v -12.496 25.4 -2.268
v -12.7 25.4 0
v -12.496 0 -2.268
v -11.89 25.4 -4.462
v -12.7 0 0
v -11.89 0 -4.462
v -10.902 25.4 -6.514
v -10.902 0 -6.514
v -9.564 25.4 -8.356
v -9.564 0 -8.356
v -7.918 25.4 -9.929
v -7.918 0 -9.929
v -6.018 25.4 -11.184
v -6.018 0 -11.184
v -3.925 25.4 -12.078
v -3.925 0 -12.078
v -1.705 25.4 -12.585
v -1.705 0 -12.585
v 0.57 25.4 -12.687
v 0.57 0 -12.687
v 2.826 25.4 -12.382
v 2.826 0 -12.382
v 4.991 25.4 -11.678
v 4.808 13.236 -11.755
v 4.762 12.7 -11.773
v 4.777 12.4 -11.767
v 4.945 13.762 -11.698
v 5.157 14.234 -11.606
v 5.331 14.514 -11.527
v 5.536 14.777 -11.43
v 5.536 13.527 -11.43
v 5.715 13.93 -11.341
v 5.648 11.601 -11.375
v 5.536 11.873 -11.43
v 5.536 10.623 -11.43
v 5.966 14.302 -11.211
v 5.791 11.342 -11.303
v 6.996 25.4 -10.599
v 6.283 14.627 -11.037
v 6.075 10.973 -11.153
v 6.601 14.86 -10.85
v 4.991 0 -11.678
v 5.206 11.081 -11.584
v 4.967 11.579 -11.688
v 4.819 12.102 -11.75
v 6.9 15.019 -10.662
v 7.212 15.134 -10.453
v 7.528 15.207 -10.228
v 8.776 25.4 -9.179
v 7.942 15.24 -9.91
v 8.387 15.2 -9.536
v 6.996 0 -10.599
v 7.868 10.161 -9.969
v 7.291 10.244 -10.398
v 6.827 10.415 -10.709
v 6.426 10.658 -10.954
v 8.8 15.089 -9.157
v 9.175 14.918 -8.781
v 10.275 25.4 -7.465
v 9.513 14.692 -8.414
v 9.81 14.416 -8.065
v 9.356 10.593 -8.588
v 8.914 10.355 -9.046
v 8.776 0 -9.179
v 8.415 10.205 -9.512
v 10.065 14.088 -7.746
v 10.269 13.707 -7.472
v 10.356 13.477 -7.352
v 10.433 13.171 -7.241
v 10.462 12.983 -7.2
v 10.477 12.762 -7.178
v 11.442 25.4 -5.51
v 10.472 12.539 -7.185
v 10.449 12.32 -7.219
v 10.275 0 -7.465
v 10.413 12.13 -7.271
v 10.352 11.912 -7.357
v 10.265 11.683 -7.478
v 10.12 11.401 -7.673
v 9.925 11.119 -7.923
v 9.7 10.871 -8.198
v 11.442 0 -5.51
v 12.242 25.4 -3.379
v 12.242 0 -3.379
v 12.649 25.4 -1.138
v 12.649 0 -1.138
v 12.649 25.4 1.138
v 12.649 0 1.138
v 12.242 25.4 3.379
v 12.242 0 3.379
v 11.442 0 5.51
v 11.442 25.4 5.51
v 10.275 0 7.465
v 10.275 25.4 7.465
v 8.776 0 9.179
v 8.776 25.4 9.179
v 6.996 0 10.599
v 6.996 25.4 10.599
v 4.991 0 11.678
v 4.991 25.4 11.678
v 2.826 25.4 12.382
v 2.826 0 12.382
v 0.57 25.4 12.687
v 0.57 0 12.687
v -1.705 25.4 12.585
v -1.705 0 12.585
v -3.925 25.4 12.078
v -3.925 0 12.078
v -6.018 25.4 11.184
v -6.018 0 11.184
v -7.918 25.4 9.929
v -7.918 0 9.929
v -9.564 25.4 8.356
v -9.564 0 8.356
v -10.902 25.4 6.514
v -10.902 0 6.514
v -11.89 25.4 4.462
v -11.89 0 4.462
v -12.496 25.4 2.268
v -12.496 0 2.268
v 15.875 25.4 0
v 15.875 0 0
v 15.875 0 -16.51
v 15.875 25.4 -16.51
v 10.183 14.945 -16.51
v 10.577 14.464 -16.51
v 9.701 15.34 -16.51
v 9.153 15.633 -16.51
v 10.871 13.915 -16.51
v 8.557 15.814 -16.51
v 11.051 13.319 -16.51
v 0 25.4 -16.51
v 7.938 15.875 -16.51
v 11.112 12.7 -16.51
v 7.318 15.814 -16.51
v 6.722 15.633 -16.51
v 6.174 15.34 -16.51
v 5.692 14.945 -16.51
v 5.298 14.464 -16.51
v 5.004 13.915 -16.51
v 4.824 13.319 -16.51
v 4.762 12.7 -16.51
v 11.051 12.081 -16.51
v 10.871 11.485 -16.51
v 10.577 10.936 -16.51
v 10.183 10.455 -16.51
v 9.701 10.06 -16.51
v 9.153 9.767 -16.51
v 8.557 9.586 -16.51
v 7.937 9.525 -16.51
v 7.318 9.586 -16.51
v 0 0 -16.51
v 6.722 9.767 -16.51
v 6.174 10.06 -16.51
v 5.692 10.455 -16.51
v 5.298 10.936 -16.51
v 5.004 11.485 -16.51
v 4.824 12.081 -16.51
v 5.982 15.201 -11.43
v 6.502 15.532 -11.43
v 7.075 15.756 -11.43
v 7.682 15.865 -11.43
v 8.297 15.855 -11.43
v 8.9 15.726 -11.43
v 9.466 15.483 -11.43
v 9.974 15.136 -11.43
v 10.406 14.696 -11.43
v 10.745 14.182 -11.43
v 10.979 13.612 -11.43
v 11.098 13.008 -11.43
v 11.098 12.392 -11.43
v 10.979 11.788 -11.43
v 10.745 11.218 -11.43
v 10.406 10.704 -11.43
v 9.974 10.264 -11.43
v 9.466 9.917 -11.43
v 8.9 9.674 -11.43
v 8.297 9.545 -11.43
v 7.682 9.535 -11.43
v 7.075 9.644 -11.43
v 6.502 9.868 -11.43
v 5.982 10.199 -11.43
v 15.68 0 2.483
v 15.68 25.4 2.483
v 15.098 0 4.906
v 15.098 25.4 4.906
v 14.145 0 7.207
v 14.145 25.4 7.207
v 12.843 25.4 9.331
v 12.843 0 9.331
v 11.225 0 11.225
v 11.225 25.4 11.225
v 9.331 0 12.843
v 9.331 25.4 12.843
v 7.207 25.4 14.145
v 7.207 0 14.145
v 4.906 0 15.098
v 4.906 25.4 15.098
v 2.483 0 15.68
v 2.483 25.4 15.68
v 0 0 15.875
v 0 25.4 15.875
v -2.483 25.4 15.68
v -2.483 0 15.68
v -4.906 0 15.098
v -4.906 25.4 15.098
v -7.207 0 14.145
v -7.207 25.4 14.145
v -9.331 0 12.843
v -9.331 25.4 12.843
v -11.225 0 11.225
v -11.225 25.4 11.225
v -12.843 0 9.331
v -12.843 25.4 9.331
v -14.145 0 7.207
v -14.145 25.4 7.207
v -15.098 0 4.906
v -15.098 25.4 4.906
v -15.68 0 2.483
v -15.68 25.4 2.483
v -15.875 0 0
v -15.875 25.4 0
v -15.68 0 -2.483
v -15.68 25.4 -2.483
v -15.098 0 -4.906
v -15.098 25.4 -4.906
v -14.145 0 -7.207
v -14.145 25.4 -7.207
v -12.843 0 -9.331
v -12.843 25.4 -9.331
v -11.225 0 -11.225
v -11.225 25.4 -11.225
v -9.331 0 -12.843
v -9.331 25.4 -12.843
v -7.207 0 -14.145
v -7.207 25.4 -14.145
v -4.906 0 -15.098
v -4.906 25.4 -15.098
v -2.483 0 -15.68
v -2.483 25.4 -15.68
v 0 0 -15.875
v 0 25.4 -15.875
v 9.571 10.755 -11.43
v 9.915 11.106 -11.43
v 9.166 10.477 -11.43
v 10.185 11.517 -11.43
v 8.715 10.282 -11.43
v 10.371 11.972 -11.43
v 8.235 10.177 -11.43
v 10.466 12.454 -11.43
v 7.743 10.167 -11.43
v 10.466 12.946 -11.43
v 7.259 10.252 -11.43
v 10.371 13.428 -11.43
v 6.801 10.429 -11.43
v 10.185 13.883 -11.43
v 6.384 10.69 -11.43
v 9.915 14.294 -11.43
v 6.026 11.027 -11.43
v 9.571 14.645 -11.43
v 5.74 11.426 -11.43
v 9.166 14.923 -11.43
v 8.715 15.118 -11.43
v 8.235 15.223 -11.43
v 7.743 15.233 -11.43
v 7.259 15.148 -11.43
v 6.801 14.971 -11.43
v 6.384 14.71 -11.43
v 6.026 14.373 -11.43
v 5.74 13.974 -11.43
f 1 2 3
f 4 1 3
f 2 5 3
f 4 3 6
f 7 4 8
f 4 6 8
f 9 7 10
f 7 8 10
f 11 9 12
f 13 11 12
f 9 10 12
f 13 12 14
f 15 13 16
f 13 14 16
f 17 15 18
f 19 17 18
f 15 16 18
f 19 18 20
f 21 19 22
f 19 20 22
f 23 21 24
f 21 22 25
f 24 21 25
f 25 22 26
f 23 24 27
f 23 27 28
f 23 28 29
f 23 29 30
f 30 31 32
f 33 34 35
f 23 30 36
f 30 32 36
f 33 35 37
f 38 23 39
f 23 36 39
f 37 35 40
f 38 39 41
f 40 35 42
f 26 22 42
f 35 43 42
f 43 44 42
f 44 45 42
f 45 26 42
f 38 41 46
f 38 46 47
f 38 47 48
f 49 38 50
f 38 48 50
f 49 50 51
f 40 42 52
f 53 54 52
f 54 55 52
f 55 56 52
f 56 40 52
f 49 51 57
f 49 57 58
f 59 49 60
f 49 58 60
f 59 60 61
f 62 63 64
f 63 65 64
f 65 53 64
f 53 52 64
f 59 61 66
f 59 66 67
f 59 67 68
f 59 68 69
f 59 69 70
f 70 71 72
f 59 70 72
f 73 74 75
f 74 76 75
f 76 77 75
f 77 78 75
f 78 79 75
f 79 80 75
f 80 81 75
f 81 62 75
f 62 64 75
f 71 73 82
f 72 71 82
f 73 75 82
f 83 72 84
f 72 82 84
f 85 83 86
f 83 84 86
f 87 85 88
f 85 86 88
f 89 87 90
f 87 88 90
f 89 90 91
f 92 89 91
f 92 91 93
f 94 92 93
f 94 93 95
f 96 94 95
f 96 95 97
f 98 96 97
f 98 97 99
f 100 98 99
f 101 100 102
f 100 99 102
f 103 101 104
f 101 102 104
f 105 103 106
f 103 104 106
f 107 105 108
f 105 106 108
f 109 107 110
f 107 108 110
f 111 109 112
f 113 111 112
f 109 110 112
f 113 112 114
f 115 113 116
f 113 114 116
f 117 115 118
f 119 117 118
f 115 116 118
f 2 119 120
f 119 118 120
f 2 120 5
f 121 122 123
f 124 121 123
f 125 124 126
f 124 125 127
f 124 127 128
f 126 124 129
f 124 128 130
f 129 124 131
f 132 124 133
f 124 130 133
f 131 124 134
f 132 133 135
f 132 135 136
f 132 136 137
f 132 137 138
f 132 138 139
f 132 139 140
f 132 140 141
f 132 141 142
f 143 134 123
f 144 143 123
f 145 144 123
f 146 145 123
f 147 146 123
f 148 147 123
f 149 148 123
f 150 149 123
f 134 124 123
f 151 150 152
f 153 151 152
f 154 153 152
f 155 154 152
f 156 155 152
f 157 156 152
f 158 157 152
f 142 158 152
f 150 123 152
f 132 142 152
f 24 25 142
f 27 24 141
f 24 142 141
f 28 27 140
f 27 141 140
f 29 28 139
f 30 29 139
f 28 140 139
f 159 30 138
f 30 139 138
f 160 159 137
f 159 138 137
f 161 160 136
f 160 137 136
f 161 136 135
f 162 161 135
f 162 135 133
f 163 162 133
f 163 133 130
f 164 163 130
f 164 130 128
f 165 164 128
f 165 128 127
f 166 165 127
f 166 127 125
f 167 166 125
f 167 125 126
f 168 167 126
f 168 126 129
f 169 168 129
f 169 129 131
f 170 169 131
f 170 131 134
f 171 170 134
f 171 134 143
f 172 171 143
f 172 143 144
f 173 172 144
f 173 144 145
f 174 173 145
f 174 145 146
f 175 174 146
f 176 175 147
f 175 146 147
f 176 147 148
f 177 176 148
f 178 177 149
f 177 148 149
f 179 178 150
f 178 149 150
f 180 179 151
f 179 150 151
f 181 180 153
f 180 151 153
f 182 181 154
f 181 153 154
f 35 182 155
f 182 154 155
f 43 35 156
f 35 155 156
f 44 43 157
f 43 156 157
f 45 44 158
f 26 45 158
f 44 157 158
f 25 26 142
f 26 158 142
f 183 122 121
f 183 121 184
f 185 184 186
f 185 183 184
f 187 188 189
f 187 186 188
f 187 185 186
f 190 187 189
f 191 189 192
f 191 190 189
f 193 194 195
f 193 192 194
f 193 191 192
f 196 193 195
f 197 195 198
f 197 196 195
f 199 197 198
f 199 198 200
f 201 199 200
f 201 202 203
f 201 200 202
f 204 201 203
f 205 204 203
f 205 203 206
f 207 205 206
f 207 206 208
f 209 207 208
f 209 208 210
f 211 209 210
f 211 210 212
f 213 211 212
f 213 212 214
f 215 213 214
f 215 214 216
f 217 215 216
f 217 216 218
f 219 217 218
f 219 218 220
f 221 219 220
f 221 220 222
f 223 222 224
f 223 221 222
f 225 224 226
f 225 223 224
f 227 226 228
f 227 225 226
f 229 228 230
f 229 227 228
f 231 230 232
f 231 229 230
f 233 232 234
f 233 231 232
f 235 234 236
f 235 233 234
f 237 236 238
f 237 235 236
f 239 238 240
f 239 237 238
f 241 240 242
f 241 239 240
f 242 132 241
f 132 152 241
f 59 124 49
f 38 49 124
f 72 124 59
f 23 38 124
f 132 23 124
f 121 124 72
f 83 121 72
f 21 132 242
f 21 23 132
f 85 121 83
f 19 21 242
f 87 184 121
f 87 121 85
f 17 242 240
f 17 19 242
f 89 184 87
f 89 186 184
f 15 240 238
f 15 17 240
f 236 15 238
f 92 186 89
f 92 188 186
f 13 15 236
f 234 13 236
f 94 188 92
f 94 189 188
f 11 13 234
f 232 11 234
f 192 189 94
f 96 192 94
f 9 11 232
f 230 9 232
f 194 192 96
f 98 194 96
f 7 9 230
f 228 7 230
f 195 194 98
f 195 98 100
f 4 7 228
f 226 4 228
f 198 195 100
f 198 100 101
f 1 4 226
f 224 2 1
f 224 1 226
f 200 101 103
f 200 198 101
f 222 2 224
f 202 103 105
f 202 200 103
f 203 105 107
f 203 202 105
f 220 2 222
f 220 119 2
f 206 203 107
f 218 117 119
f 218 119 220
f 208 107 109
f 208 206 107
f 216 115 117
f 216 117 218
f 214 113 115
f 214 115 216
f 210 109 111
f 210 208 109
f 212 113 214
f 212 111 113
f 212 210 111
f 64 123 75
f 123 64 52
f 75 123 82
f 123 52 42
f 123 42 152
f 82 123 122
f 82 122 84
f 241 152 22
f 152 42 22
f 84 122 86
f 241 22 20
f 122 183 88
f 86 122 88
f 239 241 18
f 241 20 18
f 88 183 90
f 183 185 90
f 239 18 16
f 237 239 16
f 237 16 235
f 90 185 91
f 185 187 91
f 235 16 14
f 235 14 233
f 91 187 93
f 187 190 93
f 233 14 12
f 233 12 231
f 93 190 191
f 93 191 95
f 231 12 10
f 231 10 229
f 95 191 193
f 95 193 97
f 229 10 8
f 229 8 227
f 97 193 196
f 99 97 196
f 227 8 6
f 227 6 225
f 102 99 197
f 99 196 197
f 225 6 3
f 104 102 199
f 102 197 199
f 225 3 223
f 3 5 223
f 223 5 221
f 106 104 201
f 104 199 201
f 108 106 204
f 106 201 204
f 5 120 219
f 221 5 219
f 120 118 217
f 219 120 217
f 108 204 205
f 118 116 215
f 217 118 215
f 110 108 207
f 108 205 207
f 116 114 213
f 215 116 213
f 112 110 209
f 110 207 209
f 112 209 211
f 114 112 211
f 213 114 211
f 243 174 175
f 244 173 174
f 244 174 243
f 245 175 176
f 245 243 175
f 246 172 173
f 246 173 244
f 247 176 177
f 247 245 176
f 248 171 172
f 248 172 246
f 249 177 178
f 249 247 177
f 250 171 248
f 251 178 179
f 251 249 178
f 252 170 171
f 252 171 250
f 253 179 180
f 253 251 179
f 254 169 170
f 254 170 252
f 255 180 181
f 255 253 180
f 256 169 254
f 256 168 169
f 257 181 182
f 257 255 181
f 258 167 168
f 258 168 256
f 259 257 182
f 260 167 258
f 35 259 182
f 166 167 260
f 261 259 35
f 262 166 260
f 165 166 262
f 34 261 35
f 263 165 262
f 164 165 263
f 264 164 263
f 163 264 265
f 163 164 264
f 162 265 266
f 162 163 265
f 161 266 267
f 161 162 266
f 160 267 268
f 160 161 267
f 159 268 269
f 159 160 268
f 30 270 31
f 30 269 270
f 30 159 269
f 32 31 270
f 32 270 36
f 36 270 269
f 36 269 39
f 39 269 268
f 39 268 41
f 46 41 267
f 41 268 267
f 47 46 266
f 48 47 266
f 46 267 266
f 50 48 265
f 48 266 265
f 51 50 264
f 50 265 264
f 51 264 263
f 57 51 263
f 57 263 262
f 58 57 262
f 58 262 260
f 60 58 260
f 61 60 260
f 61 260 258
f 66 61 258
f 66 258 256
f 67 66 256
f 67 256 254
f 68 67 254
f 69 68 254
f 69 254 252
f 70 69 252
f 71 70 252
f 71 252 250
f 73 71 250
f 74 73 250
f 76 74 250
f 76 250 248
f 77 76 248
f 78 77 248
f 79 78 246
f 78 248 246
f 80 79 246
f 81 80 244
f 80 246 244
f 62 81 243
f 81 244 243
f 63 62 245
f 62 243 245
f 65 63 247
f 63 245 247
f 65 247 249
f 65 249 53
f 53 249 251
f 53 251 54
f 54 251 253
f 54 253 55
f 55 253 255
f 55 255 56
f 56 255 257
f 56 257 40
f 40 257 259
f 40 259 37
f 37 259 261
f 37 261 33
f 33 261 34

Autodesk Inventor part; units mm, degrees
ref_plane "YZ Plane" through (0, 0, 0) normal (1, 0, 0) x (0, 1, 0)
ref_plane "XZ Plane" through (0, 0, 0) normal (0, 1, 0) x (-1, 0, 0)
ref_plane "XY Plane" through (0, 0, 0) normal (0, 0, 1) x (1, 0, 0)
sketch "Sketch1" plane through (0, 0, 0) normal (0, 1, 0) x (-1, 0, 0)
  circle A0 centre (0, 0) radius 12.7
  arc A1 (0, -15.875) -> (-15.875, 0) centre (0, 0) ccw
  line L0 (-15.875, -12.7) -> (-15.875, -16.51)
  line L1 (-15.875, -16.51) -> (0, -16.51)
  line L2 (0, -16.51) -> (0, -12.7)
  line L3 (-15.875, -12.7) -> (-15.875, 0)
  dimension "d0" = 25.4
  dimension "d1" = 31.75
  dimension "d2" = 3.81
extrude "Extrusion1" add sketch "Sketch1" along normal blind 25.4
sketch "Sketch2" plane through (15.875, 0, -16.51) normal (0, 0, -1) x (-1, 0, 0)
  circle A0 centre (7.9375, 12.7) radius 2.54
  line L0 (15.875, 0) -> (15.875, 25.4) projected
  dimension "d5" = 5.08
  dimension "d6" = 7.9375
extrude "Extrusion2" cut sketch "Sketch2" against normal blind 13.081
sketch "Sketch3" plane through (15.875, 0, -16.51) normal (0, 0, -1) x (-1, 0, 0)
  circle A0 centre (7.9375, 12.7) radius 3.175
  line L0 (15.875, 0) -> (15.875, 25.4) projected
  dimension "d9" = 6.35
  dimension "d10" = 7.9375
extrude "Extrusion3" cut sketch "Sketch3" against normal blind 5.08
properties part number "motor spinner"
